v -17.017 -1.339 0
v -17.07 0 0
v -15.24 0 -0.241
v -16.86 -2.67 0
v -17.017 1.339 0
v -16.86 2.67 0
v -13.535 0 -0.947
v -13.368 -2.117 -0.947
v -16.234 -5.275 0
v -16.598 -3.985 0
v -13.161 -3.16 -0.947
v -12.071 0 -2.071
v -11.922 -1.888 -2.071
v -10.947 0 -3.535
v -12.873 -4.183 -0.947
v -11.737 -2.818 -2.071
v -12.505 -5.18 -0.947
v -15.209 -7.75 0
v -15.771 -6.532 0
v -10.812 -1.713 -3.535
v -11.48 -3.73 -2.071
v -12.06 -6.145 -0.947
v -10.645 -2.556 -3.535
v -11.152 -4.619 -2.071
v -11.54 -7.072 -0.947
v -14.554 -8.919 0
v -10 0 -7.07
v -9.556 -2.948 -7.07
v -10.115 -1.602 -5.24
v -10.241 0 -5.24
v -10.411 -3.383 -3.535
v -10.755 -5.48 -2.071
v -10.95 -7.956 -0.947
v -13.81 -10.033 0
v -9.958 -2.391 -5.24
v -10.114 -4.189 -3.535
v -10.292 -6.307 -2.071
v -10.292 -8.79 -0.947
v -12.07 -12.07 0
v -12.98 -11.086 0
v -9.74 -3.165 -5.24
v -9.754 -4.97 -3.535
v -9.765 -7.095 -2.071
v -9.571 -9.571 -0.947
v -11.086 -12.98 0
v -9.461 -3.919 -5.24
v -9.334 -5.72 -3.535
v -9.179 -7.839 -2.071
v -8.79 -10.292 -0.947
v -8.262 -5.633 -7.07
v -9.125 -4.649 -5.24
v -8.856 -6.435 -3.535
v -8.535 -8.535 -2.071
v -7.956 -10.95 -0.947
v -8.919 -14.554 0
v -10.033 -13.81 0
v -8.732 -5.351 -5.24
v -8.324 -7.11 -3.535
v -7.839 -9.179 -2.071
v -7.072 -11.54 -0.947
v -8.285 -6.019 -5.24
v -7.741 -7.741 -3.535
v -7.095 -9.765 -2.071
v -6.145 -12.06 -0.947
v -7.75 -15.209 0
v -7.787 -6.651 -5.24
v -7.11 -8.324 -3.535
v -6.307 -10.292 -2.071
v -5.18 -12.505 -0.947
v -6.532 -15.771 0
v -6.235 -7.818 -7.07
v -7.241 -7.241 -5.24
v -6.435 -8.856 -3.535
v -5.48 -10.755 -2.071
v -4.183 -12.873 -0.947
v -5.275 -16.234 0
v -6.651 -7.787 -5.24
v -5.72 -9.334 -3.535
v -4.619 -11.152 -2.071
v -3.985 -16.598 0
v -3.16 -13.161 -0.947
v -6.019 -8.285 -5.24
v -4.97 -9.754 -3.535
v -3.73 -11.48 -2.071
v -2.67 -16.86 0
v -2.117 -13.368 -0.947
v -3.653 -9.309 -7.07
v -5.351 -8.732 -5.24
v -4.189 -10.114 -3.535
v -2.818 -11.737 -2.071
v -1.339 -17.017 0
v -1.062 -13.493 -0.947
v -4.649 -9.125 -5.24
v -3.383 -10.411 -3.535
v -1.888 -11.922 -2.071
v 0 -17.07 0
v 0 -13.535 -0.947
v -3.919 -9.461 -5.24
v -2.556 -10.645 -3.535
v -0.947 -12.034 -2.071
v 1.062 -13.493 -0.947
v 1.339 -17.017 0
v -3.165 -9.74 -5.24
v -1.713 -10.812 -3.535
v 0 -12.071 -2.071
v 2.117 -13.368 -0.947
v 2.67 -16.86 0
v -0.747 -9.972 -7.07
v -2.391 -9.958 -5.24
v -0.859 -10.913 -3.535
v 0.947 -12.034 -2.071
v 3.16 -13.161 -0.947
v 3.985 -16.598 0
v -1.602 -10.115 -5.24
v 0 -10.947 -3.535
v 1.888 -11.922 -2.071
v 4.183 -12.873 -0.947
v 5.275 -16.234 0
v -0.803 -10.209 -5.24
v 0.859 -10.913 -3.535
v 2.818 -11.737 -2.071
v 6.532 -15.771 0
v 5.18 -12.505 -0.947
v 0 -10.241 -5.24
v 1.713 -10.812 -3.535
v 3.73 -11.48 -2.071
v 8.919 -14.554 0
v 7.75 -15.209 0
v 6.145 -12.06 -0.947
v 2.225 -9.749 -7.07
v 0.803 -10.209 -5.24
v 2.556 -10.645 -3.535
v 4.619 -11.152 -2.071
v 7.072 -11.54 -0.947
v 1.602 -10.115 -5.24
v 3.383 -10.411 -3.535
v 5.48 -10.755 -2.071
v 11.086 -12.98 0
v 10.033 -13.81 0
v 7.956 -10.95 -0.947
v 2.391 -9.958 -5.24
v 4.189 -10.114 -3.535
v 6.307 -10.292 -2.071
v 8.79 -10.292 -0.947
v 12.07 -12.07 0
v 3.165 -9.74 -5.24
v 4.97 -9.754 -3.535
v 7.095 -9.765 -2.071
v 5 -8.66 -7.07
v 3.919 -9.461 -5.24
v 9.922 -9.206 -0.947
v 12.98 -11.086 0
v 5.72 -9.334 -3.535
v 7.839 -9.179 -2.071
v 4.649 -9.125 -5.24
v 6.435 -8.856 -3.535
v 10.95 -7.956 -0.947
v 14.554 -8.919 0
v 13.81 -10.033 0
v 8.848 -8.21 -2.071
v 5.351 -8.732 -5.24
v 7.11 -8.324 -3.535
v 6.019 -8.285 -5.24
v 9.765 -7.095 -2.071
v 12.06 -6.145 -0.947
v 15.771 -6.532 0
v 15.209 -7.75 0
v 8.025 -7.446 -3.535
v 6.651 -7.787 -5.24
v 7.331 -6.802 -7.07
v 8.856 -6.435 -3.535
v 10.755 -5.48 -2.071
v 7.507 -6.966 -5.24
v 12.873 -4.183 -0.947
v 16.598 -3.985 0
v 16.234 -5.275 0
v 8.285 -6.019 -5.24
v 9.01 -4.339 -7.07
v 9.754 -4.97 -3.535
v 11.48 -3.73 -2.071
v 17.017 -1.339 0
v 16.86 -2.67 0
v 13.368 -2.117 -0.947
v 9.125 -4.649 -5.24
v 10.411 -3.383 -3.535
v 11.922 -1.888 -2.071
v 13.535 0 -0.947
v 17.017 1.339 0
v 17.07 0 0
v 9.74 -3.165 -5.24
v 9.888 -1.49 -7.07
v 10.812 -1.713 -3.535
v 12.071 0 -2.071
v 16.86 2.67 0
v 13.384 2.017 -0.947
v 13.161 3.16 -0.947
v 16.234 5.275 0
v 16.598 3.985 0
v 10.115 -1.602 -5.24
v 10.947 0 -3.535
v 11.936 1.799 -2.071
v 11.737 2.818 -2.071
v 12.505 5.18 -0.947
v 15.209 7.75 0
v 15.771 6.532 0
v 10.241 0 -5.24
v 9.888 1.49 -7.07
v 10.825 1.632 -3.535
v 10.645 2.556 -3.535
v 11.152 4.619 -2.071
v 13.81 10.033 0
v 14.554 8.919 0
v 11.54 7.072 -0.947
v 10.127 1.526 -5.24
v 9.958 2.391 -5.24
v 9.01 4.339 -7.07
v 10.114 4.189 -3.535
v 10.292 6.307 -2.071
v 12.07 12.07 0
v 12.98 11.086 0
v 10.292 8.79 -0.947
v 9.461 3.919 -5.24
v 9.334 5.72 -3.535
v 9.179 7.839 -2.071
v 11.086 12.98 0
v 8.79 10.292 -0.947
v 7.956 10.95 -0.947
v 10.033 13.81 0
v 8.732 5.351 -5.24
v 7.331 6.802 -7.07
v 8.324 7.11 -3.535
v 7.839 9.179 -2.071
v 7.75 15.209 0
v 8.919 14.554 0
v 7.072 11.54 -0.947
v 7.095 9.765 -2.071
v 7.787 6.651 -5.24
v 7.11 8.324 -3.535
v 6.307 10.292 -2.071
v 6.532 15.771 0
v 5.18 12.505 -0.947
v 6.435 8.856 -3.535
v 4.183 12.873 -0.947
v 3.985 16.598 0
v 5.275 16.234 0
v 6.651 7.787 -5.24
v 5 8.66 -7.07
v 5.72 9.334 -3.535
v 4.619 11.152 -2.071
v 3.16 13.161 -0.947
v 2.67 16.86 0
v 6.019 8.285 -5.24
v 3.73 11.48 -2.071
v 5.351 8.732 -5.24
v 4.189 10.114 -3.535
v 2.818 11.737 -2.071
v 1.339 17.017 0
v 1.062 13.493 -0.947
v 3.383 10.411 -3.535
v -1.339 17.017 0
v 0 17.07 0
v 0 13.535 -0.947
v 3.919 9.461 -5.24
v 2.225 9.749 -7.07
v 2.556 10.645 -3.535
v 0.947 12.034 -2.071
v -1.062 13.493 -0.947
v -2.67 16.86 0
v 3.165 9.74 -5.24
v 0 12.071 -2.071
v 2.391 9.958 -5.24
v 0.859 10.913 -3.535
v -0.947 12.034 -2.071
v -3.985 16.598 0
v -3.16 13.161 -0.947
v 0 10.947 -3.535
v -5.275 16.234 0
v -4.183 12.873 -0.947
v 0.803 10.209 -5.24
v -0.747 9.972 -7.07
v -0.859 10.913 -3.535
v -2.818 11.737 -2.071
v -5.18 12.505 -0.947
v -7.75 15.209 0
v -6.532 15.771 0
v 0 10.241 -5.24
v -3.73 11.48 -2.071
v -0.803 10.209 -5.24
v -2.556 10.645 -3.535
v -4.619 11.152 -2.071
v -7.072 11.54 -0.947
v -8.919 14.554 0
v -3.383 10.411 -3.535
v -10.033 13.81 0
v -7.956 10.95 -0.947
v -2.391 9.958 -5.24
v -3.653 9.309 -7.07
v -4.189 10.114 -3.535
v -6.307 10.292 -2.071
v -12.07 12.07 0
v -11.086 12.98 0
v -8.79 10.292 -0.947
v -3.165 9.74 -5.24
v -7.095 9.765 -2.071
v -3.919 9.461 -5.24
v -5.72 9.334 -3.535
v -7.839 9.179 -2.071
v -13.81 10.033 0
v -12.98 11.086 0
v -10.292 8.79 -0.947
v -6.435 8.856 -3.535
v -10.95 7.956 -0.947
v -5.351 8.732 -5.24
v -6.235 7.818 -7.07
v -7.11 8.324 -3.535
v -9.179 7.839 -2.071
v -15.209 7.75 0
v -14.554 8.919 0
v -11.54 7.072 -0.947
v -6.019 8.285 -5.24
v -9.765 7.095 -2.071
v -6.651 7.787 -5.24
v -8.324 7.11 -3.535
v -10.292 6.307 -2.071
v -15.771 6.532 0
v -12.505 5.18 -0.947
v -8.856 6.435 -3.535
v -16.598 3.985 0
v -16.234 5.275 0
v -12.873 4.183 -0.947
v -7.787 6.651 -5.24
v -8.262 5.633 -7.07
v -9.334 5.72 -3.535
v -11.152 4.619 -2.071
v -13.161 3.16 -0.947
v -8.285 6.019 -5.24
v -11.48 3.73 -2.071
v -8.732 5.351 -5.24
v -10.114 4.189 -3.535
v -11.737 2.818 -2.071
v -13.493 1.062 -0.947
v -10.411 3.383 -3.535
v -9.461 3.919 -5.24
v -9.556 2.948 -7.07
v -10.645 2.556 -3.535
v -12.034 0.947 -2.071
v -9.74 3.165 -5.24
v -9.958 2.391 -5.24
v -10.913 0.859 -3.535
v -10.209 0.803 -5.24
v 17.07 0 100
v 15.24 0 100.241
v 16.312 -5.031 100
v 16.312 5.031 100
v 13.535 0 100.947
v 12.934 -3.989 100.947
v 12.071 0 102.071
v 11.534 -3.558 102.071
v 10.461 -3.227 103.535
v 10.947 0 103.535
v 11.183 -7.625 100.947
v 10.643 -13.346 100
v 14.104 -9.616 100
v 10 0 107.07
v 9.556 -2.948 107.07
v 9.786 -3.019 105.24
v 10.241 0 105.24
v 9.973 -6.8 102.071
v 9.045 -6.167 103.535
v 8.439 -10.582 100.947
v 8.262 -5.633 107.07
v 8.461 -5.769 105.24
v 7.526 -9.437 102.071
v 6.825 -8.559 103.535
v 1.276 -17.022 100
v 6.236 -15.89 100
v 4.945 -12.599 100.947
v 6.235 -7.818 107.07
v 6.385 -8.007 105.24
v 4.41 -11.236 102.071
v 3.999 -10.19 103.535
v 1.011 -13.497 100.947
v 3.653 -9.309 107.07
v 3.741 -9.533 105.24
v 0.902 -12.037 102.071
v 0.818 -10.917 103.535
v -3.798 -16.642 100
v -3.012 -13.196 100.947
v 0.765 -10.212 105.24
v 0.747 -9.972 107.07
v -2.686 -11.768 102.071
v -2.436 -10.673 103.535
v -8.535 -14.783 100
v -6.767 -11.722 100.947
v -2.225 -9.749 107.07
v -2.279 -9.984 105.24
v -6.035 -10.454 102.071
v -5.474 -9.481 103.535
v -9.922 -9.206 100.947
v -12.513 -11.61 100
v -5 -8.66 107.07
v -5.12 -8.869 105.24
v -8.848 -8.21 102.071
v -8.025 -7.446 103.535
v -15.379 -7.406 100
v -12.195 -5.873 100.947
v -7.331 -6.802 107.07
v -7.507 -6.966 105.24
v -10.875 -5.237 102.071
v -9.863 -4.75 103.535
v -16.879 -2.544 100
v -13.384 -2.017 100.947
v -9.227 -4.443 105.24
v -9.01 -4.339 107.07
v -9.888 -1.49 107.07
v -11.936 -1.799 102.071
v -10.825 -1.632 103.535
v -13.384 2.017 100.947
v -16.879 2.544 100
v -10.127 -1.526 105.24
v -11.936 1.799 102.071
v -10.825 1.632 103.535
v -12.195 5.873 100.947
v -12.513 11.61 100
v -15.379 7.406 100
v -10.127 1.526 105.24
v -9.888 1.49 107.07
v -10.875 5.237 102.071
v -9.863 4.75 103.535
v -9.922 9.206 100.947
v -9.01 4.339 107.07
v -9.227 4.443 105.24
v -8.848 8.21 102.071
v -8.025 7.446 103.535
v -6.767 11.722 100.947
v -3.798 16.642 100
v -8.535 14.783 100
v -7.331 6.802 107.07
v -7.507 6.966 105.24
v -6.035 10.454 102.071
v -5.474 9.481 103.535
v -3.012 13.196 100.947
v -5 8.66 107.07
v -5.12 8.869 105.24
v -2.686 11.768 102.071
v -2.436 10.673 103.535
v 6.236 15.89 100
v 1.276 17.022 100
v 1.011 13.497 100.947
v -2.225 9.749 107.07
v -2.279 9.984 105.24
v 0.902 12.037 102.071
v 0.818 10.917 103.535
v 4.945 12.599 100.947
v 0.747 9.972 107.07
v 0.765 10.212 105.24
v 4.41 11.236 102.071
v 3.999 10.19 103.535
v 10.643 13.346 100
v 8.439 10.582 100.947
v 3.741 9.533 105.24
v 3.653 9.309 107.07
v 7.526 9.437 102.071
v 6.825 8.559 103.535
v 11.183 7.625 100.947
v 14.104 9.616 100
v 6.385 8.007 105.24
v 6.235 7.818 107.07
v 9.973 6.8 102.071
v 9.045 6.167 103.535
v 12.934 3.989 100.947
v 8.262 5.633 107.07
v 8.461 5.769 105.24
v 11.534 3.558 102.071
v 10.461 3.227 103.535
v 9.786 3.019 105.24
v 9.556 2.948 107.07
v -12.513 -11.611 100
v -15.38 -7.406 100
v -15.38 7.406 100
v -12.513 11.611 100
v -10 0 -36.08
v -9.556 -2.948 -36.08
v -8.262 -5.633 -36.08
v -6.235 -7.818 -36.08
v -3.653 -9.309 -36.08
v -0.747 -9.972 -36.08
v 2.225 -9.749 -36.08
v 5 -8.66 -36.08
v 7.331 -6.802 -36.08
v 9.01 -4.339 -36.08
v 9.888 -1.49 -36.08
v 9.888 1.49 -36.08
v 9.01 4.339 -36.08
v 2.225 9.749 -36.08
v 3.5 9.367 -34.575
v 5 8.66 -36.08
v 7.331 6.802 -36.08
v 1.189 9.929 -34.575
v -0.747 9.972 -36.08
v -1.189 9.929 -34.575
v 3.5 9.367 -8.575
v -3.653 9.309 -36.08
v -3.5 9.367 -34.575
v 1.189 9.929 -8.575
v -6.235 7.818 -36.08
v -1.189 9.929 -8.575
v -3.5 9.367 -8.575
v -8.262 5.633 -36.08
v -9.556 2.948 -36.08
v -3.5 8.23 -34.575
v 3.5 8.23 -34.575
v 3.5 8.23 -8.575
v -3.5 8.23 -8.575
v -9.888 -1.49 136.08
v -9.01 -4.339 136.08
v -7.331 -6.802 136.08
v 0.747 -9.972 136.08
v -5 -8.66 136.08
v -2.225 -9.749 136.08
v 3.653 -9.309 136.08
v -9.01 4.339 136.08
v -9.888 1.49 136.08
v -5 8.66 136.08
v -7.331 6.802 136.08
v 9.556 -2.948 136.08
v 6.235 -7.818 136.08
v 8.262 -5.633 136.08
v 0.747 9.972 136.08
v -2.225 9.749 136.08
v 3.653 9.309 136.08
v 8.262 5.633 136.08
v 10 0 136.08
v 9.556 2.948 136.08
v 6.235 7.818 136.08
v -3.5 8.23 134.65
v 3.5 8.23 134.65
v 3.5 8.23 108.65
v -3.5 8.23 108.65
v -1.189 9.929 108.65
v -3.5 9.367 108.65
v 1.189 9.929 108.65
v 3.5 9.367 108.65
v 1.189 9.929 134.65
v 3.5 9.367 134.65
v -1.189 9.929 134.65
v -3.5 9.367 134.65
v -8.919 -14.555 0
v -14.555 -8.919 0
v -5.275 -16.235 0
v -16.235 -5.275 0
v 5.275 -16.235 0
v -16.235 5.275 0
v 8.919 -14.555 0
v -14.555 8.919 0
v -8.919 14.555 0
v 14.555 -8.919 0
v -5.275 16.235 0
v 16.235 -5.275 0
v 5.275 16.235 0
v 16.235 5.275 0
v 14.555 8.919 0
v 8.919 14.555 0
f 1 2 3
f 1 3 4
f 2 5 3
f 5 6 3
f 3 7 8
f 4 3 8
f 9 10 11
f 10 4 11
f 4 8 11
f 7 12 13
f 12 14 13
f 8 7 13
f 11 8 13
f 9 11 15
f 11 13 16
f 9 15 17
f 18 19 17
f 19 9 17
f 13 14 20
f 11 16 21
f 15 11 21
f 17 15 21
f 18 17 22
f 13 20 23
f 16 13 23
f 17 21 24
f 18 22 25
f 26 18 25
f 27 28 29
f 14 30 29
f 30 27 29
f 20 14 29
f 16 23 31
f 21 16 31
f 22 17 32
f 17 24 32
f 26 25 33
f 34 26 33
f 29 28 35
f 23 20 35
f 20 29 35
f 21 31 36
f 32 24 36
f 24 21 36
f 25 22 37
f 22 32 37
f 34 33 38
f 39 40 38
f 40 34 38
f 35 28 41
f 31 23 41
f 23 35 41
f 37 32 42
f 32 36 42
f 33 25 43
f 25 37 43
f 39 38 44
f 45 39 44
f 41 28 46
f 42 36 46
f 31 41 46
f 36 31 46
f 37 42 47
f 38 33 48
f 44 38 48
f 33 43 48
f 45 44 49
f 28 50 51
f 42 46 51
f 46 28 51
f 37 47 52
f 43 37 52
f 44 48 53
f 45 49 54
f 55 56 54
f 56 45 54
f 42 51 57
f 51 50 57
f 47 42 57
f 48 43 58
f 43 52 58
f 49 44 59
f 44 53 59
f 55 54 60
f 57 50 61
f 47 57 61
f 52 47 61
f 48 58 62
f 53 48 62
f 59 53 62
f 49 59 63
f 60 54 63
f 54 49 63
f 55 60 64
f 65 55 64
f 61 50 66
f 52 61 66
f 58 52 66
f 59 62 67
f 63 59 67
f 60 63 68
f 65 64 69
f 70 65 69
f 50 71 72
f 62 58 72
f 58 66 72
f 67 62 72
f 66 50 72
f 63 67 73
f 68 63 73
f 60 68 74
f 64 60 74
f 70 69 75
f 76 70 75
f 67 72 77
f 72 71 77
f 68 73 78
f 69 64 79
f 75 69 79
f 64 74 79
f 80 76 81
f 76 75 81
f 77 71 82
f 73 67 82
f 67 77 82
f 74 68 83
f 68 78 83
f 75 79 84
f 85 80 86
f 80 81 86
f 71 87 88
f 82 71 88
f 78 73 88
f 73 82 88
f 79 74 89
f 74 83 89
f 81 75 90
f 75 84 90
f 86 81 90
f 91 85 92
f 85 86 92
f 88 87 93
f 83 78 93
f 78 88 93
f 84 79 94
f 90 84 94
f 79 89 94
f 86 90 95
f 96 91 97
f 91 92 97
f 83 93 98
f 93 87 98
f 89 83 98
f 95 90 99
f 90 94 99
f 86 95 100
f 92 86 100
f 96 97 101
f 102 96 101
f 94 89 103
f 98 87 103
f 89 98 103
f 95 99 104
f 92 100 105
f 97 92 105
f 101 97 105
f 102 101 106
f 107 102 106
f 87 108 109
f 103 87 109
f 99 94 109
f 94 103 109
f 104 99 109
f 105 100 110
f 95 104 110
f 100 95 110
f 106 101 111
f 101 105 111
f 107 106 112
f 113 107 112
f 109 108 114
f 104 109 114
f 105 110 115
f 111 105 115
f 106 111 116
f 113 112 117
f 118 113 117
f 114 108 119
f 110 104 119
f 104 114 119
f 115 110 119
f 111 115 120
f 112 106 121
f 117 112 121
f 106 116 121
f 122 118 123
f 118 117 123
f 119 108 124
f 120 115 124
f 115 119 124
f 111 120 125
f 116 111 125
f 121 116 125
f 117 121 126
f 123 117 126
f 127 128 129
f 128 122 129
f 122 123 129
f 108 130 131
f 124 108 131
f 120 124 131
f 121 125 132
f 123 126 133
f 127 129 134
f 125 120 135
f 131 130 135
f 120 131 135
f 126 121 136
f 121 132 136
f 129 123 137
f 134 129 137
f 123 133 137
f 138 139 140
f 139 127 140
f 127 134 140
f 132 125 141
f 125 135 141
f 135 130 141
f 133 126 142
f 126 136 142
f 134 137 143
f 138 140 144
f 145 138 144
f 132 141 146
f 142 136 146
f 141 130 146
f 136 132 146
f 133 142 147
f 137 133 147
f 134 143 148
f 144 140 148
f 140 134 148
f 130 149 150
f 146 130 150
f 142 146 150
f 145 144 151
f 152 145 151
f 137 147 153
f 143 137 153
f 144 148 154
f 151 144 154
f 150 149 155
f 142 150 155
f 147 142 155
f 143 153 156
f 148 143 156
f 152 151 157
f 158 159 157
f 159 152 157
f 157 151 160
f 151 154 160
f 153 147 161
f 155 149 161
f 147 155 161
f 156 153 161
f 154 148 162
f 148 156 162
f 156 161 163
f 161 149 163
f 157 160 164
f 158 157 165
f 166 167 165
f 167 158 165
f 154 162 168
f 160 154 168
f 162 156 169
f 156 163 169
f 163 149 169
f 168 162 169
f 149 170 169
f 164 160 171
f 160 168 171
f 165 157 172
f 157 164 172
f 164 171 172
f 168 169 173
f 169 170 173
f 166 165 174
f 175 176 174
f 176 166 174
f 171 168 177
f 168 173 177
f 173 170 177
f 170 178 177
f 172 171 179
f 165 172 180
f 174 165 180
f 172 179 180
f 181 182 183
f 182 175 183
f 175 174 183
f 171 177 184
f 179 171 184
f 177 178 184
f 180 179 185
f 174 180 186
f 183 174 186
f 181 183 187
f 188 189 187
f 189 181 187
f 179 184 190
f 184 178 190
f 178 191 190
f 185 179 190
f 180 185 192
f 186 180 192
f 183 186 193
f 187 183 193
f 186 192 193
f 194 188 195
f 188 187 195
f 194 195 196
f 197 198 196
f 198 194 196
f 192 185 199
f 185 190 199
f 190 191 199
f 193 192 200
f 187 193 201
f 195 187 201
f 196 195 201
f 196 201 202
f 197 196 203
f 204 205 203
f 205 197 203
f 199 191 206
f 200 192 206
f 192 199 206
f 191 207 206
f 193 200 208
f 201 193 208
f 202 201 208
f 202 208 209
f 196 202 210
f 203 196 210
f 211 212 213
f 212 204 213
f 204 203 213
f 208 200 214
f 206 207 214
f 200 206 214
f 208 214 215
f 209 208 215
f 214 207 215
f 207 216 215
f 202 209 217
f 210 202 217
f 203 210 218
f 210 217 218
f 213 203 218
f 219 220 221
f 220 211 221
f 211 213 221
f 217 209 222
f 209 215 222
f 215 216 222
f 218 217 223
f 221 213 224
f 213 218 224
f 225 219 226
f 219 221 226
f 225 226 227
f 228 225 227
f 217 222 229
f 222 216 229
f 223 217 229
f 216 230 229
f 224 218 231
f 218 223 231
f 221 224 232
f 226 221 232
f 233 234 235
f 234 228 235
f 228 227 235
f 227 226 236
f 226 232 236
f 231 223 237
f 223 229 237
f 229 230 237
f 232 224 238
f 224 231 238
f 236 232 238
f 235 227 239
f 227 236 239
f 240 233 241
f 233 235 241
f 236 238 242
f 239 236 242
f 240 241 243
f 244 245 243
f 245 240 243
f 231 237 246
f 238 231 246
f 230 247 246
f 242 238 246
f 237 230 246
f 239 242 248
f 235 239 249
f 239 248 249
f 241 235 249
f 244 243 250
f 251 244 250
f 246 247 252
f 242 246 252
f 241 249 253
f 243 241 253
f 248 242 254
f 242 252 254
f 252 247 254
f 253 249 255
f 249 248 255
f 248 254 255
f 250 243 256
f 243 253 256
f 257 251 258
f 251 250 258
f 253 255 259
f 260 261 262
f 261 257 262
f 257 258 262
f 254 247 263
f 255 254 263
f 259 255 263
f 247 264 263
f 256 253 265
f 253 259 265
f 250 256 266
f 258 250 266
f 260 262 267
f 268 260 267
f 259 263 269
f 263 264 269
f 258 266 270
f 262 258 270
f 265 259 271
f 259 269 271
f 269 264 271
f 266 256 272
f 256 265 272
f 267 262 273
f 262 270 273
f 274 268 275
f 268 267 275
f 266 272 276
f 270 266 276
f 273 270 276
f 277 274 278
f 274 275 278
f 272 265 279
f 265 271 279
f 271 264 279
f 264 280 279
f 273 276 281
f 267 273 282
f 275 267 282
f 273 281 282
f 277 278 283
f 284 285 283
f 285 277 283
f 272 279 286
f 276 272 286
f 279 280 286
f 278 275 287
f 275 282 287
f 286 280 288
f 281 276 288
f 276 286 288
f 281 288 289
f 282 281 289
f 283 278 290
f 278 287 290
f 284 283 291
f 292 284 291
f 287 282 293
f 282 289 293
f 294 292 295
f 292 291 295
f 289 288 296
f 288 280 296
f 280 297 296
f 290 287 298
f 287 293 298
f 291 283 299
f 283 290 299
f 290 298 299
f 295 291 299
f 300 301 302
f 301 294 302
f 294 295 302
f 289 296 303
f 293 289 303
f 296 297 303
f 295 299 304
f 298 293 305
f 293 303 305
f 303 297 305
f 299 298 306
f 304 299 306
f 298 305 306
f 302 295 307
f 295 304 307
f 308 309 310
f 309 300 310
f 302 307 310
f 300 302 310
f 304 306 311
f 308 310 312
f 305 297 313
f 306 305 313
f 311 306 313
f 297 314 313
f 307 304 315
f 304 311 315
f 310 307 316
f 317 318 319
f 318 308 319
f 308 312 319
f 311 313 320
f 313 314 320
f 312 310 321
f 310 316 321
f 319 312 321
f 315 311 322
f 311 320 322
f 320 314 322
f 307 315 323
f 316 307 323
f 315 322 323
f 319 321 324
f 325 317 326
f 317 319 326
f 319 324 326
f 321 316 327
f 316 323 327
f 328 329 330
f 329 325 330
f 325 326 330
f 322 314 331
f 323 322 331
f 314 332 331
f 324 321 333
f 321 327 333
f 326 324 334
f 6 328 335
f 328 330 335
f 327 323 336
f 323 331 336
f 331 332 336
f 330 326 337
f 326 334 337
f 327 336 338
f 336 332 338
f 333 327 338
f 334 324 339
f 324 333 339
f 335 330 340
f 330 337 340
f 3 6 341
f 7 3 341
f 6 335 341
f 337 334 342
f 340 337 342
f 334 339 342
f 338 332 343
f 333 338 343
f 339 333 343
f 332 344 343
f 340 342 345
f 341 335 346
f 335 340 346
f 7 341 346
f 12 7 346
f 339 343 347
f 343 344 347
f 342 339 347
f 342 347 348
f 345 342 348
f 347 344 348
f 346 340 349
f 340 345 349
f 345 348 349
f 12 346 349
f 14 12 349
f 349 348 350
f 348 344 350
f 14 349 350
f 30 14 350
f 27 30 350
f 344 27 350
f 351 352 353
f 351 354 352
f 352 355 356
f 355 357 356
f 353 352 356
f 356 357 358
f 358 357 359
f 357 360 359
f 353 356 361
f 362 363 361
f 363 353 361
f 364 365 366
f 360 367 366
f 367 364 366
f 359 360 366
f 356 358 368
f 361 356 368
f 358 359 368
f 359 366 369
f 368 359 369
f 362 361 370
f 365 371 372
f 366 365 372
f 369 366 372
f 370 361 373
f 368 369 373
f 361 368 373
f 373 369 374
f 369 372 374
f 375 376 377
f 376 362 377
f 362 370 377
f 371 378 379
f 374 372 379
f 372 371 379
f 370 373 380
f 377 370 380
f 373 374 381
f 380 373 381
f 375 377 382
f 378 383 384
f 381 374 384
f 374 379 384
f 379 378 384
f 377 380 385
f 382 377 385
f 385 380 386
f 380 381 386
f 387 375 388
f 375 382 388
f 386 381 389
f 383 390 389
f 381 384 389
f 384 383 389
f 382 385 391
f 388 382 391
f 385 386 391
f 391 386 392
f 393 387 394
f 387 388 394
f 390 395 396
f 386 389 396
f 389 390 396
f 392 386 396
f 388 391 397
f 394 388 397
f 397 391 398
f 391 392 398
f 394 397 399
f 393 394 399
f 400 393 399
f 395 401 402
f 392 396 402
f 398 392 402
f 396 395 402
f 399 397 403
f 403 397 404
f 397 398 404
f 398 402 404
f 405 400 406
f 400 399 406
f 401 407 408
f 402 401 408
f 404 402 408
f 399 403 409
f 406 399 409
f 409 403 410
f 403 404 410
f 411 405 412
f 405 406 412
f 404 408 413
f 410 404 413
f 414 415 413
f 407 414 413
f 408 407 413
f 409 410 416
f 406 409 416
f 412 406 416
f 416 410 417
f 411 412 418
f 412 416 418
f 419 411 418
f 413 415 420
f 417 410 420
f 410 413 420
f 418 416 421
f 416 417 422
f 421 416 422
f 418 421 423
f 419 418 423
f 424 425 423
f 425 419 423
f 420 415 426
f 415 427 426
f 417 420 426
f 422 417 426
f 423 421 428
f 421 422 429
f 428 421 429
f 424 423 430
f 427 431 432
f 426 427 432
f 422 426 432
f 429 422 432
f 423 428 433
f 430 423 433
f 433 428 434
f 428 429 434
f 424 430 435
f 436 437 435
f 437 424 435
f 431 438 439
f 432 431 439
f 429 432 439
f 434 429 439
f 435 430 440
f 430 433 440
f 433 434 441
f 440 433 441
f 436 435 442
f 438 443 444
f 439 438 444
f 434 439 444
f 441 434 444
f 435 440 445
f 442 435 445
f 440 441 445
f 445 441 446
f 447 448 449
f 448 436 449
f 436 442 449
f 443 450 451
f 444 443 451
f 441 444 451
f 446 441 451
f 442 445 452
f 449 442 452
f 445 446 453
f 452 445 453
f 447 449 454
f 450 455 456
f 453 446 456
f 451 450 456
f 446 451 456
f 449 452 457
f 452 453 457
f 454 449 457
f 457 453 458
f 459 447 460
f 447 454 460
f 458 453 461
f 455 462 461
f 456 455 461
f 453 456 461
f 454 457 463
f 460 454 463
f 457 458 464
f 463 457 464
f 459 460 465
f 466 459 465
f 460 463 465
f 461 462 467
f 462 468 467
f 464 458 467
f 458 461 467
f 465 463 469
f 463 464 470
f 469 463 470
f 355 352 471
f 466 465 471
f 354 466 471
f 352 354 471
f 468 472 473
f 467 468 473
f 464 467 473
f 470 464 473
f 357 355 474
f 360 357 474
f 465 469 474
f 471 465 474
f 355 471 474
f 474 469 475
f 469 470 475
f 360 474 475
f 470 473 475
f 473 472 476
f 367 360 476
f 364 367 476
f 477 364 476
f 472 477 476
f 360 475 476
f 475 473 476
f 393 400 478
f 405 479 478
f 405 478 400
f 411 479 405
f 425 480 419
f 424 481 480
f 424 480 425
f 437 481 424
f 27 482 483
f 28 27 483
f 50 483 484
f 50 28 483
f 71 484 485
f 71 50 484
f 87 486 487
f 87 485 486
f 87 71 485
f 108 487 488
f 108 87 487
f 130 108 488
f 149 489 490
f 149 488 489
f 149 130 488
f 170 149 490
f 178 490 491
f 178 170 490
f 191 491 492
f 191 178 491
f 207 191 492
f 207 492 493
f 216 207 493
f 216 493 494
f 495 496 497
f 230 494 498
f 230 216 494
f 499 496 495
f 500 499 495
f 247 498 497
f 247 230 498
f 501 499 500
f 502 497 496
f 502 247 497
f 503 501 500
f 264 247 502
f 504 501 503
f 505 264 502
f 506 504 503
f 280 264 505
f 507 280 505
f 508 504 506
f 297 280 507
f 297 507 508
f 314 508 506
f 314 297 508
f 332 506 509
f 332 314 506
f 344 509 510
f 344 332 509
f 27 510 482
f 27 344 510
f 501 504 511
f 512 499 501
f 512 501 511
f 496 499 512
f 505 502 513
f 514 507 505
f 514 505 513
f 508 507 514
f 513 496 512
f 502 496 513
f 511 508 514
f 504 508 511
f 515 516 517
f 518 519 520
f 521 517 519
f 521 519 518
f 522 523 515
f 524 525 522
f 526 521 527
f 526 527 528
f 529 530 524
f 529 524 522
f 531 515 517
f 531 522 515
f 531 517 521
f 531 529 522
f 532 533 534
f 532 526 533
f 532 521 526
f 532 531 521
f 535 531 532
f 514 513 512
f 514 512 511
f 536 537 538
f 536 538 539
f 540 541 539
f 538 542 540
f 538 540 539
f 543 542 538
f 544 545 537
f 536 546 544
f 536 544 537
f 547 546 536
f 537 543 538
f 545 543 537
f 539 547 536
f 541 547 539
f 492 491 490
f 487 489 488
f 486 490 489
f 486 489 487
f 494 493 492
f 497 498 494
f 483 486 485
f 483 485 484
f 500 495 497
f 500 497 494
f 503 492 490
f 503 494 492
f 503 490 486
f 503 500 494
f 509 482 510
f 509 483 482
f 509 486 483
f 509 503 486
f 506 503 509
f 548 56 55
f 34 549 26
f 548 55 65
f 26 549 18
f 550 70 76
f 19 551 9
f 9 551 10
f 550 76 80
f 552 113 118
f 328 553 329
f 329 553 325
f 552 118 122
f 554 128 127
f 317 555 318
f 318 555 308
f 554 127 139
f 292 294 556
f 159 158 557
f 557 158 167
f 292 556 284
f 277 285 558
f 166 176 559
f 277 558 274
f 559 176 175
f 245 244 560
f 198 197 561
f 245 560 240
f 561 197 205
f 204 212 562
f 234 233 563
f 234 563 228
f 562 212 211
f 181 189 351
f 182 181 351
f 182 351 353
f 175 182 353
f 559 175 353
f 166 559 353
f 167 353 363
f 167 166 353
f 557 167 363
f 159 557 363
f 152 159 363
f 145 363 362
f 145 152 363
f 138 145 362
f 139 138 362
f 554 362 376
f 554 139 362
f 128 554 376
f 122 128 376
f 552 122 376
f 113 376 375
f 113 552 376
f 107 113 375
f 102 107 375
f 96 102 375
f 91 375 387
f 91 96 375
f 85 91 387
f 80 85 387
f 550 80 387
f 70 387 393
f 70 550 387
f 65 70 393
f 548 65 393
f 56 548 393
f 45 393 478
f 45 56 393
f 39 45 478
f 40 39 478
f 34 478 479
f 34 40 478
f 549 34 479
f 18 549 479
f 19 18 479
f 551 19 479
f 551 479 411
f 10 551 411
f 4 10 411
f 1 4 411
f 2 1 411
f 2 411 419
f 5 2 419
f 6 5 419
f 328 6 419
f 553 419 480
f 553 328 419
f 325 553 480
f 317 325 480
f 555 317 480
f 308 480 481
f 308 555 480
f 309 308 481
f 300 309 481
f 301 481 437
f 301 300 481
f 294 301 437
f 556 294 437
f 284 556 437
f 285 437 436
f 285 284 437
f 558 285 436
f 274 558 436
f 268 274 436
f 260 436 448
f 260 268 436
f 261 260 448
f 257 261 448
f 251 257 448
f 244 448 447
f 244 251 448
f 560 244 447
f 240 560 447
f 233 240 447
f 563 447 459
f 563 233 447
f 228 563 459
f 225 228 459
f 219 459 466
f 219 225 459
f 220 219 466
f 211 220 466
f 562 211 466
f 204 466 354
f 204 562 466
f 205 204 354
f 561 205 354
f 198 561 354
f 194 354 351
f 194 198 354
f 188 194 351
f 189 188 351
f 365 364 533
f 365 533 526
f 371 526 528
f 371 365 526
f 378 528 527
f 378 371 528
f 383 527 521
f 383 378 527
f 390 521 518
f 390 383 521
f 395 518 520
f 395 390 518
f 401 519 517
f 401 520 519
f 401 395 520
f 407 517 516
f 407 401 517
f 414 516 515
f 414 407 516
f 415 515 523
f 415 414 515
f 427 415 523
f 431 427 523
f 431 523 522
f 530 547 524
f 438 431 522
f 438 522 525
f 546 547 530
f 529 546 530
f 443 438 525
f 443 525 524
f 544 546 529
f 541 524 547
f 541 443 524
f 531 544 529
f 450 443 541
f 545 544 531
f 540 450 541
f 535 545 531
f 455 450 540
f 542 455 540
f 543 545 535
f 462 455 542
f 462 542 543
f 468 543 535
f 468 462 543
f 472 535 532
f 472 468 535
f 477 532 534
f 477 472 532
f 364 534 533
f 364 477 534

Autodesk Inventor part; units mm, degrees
ref_plane "YZ Plane" through (0, 0, 0) normal (1, 0, 0) x (0, 1, 0)
ref_plane "XY Plane" through (0, 0, 0) normal (0, 0, 1) x (1, 0, 0)
sketch "Boceto1" plane through (0, 0, 0) normal (0, 0, 1) x (1, 0, 0)
  circle A0 centre (0, 0) radius 17.07
  dimension "d0" = 34.14
extrude "Extrusión1" add sketch "Boceto1" along normal blind 100
sketch "Boceto2" plane through (0, 0, 100) normal (0, 0, 1) x (1, 0, 0)
  circle A0 centre (0, 0) radius 10
  dimension "d3" = 20
extrude "Extrusión2" add sketch "Boceto2" along normal blind 36.08
sketch "Boceto3" plane through (0, 0, 0) normal (0, 0, -1) x (-1, 0, 0)
  circle A0 centre (0, 0) radius 10
  dimension "d6" = 20
extrude "Extrusión3" add sketch "Boceto3" along normal blind 36.08
fillet "Empalme1" radius 7.07 1 edges at (-10, 0, 100)
fillet "Empalme2" radius 7.07 1 edges at (10, 0, 0)
ref_plane "Plano de trabajo1" through (0, 10, 100) normal (0, 1, 0) x (-1, 0, 0)
sketch "Boceto4" plane through (0, 10, 100) normal (0, 1, 0) x (-1, 0, 0)
  line L0 (10, 36.08) -> (-10, 36.08) projected
  line L1 (-3.5, 34.6498) -> (3.5, 34.6498)
  line L2 (3.5, 34.6498) -> (3.5, 8.6498)
  line L3 (3.5, 8.6498) -> (-3.5, 8.6498)
  line L4 (-3.5, 8.6498) -> (-3.5, 34.6498)
  line L5 (-3.5, 34.6498) -> (3.5, 8.6498) construction
  line L6 (3.5, 34.6498) -> (-3.5, 8.6498) construction
  line L7 (10, -107.07) -> (-10, -107.07) projected
  line L8 (-10, -136.08) -> (10, -136.08) projected
  line L9 (10, -107.07) -> (10, -136.08) projected
  line L10 (-3.5, -108.575) -> (3.5, -108.575)
  line L11 (3.5, -108.575) -> (3.5, -134.575)
  line L12 (3.5, -134.575) -> (-3.5, -134.575)
  line L13 (-3.5, -134.575) -> (-3.5, -108.575)
  point P0 (0, -100)
  point P1 (0, 21.6498)
  dimension "d11" = 7
  dimension "d12" = 26
  dimension "d13" = 7
  dimension "d14" = 26
extrude "Extrusión4" cut sketch "Boceto4" against normal blind 1.77
properties part number "Eje cuñero"
